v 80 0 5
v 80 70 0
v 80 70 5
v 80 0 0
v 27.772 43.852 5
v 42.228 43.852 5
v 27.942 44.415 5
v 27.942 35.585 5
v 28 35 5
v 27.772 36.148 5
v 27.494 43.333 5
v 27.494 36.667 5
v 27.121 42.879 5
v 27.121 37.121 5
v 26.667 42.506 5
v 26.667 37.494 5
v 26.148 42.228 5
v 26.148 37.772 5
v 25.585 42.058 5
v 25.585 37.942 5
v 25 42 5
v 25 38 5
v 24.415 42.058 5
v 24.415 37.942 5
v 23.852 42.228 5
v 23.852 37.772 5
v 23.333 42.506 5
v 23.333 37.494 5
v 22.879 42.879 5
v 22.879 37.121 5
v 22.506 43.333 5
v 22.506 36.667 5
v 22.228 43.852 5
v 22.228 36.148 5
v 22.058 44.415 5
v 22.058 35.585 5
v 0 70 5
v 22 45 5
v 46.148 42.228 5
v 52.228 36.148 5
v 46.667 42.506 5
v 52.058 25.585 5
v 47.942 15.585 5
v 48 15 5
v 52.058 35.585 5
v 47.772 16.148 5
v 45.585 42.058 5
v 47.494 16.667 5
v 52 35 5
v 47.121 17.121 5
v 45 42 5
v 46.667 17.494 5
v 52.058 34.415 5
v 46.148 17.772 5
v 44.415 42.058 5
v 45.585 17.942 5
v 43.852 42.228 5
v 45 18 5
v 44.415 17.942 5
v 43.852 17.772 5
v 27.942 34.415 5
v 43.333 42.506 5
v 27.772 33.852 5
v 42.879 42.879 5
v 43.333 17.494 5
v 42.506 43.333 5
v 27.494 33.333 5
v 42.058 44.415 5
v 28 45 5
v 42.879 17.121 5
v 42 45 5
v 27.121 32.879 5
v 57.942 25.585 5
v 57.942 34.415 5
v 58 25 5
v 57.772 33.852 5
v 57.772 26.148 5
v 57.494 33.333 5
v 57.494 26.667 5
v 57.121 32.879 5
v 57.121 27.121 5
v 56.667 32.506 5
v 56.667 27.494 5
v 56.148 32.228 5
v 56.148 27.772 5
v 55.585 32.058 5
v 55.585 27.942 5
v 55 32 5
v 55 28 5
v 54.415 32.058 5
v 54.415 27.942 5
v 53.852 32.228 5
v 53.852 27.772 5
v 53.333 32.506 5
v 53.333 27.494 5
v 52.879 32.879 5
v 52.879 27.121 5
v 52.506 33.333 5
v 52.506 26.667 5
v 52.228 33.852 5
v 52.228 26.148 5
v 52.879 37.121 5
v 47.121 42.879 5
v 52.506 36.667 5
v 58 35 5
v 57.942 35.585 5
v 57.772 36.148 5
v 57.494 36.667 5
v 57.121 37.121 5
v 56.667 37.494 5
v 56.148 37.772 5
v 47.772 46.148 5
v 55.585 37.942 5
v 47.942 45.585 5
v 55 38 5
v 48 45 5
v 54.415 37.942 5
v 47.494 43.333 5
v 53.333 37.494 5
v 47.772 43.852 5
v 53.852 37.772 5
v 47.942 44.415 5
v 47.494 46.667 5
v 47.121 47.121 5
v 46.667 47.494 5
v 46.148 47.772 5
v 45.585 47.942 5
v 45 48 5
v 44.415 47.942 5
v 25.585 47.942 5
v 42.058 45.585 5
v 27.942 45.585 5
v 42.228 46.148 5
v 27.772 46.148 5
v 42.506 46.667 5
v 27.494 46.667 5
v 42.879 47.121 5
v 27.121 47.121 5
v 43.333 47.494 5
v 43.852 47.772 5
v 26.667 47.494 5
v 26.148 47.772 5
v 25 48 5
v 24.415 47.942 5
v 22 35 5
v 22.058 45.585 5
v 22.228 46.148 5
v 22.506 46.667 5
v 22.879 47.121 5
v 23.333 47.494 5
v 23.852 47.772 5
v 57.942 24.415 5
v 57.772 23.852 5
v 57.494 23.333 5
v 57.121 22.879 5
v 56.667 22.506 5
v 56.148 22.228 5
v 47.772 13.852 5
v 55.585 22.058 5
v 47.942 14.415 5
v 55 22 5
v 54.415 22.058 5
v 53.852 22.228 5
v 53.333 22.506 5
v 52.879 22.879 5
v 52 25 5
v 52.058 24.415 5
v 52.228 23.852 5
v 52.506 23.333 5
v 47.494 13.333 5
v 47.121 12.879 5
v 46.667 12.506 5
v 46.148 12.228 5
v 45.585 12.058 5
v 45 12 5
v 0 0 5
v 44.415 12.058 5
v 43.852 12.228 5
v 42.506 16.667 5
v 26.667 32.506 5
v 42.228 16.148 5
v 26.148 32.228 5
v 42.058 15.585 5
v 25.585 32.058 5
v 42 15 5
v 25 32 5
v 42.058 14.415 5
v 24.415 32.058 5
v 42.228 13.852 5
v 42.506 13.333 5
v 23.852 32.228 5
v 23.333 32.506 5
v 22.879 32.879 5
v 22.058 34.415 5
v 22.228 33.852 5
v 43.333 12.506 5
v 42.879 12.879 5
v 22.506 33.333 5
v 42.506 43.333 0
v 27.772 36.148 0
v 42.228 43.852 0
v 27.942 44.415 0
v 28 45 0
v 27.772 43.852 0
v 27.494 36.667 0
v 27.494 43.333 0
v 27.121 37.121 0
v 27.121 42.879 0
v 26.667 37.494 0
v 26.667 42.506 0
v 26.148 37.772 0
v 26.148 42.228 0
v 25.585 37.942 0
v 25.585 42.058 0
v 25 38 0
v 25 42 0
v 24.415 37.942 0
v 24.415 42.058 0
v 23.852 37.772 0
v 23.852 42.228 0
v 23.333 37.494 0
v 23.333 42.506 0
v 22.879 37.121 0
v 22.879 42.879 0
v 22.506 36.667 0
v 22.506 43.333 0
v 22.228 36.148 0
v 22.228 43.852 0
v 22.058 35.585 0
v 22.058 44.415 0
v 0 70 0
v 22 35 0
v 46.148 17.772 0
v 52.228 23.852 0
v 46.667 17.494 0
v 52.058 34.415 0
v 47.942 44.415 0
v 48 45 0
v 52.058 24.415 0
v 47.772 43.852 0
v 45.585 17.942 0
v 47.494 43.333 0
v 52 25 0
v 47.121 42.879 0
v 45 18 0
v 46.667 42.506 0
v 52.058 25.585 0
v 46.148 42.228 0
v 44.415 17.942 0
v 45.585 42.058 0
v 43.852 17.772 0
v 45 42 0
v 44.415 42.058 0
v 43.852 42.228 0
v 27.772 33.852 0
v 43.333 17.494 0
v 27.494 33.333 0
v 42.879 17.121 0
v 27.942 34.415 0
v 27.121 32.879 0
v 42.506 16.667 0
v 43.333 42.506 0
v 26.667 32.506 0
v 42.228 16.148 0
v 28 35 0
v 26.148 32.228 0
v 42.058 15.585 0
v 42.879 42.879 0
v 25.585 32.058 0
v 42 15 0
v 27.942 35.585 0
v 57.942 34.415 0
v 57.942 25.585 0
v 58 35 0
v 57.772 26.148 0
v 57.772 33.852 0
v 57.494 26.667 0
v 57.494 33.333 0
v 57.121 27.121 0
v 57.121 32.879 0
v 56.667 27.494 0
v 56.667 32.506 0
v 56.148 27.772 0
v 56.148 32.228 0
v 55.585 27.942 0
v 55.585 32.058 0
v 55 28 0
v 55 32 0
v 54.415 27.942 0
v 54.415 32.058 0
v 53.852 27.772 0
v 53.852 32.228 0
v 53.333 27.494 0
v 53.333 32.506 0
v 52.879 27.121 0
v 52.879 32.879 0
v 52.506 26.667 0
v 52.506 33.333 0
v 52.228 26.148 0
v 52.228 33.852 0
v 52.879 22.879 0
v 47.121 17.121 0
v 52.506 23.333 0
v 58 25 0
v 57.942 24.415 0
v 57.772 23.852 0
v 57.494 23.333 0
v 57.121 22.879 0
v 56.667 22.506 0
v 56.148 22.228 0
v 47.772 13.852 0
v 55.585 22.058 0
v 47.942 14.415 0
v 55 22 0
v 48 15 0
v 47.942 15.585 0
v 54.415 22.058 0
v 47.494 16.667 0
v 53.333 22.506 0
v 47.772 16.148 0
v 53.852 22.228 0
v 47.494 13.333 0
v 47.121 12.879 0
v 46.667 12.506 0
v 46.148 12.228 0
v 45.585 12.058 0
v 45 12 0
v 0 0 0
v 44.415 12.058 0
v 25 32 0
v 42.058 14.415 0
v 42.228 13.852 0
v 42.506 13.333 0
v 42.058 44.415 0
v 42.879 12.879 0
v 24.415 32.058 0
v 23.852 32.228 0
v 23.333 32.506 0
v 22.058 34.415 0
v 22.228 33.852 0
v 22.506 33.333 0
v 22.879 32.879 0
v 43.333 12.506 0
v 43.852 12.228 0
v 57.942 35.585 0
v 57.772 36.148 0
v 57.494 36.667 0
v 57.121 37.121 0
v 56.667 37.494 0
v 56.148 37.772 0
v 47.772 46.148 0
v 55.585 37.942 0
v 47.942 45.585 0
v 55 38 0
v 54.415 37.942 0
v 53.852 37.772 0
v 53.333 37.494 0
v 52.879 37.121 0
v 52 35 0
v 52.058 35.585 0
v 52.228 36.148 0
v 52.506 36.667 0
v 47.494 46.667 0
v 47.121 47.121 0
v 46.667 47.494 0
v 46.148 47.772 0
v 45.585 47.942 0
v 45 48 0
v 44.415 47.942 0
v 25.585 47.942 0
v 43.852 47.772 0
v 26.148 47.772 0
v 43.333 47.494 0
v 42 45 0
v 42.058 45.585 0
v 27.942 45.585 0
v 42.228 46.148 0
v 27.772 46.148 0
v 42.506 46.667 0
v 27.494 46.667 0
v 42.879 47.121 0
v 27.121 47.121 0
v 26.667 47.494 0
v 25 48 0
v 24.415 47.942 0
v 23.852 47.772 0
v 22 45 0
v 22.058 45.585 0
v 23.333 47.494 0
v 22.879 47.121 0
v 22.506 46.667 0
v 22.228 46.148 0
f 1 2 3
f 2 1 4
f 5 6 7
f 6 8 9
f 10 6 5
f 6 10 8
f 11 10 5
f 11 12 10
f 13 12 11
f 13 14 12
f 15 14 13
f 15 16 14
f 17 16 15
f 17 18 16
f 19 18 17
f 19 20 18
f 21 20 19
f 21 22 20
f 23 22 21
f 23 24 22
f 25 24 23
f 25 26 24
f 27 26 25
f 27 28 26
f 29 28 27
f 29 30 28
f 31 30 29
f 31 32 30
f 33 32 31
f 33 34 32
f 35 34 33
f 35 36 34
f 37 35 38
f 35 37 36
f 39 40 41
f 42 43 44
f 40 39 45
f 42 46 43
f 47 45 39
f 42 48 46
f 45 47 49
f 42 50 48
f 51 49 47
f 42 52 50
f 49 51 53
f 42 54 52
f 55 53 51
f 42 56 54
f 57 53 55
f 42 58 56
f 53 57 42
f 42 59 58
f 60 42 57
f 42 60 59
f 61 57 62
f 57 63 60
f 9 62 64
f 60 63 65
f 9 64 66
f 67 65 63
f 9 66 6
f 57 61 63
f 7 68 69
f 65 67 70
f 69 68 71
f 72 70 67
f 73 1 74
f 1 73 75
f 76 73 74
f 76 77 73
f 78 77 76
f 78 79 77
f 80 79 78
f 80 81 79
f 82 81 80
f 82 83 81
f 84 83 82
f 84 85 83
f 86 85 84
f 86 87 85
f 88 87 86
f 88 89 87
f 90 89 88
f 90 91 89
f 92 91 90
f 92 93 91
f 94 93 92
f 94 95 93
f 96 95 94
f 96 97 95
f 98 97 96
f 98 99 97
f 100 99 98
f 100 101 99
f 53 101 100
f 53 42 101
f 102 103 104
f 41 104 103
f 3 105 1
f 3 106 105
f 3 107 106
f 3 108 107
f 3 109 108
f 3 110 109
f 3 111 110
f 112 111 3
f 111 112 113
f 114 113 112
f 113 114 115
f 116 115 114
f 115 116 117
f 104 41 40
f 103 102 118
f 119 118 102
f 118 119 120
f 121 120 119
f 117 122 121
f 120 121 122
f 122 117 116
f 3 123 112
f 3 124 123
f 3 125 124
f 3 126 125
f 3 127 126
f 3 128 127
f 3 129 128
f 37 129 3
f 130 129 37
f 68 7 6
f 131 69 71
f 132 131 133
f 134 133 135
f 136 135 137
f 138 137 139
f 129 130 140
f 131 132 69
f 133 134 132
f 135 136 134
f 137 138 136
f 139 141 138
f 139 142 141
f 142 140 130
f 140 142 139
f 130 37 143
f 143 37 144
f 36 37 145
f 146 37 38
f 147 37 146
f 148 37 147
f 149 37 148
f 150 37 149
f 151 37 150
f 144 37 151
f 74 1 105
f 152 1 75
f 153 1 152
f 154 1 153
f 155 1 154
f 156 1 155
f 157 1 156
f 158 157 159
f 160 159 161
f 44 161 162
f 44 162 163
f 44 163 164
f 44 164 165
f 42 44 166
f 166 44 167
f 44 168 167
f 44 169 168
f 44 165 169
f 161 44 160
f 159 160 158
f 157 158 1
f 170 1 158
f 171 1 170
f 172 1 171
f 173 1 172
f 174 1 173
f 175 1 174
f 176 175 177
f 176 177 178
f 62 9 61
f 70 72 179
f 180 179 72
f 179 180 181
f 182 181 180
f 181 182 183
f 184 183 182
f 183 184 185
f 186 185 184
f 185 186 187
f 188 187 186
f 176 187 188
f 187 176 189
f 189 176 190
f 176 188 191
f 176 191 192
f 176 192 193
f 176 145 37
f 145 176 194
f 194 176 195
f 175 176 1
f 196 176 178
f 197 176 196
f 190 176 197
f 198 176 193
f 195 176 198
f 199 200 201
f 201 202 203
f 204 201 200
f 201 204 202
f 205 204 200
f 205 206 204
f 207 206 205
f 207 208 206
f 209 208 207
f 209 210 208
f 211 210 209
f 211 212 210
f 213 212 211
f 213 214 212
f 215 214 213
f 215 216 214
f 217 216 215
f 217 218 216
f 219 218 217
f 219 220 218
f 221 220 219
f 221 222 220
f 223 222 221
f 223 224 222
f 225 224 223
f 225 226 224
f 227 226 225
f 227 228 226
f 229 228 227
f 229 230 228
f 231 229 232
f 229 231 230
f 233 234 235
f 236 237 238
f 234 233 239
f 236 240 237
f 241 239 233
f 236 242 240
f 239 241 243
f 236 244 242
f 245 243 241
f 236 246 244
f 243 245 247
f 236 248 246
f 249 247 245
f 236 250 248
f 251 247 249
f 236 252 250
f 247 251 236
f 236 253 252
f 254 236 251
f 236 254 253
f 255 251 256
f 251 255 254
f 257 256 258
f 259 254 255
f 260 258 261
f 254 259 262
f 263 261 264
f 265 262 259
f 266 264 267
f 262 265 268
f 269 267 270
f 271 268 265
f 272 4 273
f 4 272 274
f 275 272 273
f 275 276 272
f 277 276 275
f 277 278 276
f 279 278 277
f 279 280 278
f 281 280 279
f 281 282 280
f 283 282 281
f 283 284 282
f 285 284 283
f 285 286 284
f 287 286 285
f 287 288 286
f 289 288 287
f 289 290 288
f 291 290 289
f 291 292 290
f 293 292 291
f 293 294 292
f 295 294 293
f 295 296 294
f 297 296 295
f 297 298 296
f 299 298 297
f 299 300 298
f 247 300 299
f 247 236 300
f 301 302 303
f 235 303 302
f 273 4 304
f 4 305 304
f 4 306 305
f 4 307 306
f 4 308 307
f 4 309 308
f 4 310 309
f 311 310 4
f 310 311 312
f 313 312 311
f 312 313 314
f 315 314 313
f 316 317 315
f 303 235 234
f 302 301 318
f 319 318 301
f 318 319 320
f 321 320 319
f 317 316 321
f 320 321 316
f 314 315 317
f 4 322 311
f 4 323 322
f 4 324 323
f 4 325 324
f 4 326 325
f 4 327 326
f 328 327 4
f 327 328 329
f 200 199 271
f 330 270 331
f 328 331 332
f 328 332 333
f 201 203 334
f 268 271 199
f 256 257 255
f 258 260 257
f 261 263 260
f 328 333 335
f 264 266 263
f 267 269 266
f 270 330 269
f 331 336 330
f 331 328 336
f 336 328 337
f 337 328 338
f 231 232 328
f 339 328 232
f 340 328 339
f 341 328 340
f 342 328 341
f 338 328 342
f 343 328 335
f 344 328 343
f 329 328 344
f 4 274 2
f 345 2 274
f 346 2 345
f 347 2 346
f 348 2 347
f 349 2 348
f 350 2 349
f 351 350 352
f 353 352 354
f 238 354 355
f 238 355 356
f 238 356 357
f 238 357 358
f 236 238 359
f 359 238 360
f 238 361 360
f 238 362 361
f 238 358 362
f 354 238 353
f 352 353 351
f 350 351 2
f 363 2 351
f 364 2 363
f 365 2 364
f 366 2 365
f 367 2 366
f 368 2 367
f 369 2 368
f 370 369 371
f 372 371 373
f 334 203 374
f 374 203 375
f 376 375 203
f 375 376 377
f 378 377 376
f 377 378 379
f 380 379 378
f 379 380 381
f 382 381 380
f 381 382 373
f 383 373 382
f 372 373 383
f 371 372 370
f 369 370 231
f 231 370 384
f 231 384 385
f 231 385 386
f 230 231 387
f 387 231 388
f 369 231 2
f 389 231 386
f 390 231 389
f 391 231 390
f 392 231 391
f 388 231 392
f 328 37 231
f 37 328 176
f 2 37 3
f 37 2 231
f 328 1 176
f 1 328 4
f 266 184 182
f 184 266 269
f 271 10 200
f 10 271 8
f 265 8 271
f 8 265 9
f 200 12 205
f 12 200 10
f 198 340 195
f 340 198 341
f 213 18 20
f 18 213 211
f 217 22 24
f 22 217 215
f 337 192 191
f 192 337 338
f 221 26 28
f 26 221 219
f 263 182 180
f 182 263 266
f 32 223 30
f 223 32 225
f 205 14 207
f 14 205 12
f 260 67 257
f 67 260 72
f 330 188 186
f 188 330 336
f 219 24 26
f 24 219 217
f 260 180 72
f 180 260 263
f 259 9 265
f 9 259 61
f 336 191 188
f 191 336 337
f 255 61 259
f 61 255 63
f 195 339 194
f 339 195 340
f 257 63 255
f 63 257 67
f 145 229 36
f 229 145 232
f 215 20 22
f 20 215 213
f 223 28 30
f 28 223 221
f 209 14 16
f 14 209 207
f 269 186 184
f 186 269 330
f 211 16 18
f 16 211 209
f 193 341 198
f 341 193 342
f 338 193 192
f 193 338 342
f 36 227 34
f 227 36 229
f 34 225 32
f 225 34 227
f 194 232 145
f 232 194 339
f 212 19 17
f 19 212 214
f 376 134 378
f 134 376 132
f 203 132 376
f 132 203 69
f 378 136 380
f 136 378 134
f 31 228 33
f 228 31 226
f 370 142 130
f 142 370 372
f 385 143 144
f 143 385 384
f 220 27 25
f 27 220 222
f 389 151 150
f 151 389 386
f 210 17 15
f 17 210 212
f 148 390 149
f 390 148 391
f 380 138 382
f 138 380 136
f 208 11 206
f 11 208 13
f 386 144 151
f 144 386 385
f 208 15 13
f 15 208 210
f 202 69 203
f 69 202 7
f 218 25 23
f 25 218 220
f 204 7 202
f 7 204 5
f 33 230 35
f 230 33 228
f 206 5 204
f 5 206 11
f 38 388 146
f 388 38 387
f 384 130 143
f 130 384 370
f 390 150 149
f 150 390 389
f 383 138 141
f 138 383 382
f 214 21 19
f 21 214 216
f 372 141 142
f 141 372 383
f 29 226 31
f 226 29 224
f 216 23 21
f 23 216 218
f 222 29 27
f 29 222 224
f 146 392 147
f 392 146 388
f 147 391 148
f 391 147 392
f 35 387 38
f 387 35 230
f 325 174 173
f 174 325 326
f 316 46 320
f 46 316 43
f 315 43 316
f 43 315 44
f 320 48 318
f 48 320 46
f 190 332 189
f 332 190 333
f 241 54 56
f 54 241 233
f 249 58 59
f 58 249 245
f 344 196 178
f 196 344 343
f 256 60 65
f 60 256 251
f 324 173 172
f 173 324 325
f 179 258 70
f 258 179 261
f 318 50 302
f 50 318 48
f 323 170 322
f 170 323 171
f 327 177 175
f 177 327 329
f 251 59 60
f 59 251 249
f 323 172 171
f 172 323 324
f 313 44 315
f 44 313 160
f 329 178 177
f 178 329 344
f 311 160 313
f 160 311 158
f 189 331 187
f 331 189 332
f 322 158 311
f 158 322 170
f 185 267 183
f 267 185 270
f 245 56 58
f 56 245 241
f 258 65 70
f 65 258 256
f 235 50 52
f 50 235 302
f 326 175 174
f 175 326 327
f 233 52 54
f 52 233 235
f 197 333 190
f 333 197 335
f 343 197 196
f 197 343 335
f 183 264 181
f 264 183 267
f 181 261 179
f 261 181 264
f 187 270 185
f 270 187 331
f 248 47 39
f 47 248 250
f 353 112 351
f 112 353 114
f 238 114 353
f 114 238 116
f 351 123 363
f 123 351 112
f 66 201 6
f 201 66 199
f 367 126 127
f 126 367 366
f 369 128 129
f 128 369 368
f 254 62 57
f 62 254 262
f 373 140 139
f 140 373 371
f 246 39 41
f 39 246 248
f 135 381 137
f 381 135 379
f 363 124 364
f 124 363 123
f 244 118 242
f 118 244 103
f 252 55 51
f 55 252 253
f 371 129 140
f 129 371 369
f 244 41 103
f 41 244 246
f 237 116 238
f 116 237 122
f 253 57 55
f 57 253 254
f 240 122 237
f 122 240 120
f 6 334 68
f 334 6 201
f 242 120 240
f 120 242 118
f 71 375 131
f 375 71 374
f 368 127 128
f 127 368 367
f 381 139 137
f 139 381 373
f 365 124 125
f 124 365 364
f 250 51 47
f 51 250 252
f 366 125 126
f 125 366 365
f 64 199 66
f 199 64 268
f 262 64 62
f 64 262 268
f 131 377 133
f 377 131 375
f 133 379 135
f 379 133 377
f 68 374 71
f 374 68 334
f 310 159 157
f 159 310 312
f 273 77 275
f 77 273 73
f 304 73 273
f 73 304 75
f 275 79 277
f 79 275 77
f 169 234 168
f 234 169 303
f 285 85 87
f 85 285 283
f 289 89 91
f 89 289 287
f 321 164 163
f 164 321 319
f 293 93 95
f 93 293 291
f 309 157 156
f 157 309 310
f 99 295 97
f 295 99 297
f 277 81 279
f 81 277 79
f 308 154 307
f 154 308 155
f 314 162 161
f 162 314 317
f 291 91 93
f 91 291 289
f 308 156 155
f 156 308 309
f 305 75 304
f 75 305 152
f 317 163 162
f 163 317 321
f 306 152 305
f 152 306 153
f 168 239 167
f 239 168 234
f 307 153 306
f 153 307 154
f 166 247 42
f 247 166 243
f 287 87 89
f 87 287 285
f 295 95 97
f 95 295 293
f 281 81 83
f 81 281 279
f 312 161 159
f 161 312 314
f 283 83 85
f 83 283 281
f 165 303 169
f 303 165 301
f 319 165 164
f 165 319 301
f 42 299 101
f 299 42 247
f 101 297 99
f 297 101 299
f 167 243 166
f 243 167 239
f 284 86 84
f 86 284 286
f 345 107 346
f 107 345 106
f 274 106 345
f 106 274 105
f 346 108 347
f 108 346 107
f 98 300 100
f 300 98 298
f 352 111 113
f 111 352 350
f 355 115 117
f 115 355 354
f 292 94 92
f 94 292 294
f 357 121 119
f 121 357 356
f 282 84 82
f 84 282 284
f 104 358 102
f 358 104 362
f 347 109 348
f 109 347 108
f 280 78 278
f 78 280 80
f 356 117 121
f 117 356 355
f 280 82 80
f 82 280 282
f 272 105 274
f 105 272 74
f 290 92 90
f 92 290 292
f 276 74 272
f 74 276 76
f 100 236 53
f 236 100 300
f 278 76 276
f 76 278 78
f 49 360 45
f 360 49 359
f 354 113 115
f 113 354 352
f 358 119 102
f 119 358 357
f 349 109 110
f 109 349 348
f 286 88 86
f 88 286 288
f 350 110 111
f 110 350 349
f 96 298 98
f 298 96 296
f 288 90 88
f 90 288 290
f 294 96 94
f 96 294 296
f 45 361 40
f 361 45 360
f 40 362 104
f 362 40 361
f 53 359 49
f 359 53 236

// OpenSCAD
$fn = 32;

// ----------------------------------------------------------------------
// Hole field: plate with holes at given coordinates
// ----------------------------------------------------------------------

// --- parameters (mm) ---
plate_l = 80;             // plate length, X
plate_w = 70;             // plate width, Y
plate_t = 5;              // plate thickness, Z
hole_d = 6;               // hole diameter

difference() {
  cube([plate_l, plate_w, plate_t]);
  translate([25, 35, -1]) cylinder(h = plate_t + 2, d = hole_d);
  translate([25, 45, -1]) cylinder(h = plate_t + 2, d = hole_d);
  translate([45, 15, -1]) cylinder(h = plate_t + 2, d = hole_d);
  translate([45, 45, -1]) cylinder(h = plate_t + 2, d = hole_d);
  translate([55, 25, -1]) cylinder(h = plate_t + 2, d = hole_d);
  translate([55, 35, -1]) cylinder(h = plate_t + 2, d = hole_d);
}
